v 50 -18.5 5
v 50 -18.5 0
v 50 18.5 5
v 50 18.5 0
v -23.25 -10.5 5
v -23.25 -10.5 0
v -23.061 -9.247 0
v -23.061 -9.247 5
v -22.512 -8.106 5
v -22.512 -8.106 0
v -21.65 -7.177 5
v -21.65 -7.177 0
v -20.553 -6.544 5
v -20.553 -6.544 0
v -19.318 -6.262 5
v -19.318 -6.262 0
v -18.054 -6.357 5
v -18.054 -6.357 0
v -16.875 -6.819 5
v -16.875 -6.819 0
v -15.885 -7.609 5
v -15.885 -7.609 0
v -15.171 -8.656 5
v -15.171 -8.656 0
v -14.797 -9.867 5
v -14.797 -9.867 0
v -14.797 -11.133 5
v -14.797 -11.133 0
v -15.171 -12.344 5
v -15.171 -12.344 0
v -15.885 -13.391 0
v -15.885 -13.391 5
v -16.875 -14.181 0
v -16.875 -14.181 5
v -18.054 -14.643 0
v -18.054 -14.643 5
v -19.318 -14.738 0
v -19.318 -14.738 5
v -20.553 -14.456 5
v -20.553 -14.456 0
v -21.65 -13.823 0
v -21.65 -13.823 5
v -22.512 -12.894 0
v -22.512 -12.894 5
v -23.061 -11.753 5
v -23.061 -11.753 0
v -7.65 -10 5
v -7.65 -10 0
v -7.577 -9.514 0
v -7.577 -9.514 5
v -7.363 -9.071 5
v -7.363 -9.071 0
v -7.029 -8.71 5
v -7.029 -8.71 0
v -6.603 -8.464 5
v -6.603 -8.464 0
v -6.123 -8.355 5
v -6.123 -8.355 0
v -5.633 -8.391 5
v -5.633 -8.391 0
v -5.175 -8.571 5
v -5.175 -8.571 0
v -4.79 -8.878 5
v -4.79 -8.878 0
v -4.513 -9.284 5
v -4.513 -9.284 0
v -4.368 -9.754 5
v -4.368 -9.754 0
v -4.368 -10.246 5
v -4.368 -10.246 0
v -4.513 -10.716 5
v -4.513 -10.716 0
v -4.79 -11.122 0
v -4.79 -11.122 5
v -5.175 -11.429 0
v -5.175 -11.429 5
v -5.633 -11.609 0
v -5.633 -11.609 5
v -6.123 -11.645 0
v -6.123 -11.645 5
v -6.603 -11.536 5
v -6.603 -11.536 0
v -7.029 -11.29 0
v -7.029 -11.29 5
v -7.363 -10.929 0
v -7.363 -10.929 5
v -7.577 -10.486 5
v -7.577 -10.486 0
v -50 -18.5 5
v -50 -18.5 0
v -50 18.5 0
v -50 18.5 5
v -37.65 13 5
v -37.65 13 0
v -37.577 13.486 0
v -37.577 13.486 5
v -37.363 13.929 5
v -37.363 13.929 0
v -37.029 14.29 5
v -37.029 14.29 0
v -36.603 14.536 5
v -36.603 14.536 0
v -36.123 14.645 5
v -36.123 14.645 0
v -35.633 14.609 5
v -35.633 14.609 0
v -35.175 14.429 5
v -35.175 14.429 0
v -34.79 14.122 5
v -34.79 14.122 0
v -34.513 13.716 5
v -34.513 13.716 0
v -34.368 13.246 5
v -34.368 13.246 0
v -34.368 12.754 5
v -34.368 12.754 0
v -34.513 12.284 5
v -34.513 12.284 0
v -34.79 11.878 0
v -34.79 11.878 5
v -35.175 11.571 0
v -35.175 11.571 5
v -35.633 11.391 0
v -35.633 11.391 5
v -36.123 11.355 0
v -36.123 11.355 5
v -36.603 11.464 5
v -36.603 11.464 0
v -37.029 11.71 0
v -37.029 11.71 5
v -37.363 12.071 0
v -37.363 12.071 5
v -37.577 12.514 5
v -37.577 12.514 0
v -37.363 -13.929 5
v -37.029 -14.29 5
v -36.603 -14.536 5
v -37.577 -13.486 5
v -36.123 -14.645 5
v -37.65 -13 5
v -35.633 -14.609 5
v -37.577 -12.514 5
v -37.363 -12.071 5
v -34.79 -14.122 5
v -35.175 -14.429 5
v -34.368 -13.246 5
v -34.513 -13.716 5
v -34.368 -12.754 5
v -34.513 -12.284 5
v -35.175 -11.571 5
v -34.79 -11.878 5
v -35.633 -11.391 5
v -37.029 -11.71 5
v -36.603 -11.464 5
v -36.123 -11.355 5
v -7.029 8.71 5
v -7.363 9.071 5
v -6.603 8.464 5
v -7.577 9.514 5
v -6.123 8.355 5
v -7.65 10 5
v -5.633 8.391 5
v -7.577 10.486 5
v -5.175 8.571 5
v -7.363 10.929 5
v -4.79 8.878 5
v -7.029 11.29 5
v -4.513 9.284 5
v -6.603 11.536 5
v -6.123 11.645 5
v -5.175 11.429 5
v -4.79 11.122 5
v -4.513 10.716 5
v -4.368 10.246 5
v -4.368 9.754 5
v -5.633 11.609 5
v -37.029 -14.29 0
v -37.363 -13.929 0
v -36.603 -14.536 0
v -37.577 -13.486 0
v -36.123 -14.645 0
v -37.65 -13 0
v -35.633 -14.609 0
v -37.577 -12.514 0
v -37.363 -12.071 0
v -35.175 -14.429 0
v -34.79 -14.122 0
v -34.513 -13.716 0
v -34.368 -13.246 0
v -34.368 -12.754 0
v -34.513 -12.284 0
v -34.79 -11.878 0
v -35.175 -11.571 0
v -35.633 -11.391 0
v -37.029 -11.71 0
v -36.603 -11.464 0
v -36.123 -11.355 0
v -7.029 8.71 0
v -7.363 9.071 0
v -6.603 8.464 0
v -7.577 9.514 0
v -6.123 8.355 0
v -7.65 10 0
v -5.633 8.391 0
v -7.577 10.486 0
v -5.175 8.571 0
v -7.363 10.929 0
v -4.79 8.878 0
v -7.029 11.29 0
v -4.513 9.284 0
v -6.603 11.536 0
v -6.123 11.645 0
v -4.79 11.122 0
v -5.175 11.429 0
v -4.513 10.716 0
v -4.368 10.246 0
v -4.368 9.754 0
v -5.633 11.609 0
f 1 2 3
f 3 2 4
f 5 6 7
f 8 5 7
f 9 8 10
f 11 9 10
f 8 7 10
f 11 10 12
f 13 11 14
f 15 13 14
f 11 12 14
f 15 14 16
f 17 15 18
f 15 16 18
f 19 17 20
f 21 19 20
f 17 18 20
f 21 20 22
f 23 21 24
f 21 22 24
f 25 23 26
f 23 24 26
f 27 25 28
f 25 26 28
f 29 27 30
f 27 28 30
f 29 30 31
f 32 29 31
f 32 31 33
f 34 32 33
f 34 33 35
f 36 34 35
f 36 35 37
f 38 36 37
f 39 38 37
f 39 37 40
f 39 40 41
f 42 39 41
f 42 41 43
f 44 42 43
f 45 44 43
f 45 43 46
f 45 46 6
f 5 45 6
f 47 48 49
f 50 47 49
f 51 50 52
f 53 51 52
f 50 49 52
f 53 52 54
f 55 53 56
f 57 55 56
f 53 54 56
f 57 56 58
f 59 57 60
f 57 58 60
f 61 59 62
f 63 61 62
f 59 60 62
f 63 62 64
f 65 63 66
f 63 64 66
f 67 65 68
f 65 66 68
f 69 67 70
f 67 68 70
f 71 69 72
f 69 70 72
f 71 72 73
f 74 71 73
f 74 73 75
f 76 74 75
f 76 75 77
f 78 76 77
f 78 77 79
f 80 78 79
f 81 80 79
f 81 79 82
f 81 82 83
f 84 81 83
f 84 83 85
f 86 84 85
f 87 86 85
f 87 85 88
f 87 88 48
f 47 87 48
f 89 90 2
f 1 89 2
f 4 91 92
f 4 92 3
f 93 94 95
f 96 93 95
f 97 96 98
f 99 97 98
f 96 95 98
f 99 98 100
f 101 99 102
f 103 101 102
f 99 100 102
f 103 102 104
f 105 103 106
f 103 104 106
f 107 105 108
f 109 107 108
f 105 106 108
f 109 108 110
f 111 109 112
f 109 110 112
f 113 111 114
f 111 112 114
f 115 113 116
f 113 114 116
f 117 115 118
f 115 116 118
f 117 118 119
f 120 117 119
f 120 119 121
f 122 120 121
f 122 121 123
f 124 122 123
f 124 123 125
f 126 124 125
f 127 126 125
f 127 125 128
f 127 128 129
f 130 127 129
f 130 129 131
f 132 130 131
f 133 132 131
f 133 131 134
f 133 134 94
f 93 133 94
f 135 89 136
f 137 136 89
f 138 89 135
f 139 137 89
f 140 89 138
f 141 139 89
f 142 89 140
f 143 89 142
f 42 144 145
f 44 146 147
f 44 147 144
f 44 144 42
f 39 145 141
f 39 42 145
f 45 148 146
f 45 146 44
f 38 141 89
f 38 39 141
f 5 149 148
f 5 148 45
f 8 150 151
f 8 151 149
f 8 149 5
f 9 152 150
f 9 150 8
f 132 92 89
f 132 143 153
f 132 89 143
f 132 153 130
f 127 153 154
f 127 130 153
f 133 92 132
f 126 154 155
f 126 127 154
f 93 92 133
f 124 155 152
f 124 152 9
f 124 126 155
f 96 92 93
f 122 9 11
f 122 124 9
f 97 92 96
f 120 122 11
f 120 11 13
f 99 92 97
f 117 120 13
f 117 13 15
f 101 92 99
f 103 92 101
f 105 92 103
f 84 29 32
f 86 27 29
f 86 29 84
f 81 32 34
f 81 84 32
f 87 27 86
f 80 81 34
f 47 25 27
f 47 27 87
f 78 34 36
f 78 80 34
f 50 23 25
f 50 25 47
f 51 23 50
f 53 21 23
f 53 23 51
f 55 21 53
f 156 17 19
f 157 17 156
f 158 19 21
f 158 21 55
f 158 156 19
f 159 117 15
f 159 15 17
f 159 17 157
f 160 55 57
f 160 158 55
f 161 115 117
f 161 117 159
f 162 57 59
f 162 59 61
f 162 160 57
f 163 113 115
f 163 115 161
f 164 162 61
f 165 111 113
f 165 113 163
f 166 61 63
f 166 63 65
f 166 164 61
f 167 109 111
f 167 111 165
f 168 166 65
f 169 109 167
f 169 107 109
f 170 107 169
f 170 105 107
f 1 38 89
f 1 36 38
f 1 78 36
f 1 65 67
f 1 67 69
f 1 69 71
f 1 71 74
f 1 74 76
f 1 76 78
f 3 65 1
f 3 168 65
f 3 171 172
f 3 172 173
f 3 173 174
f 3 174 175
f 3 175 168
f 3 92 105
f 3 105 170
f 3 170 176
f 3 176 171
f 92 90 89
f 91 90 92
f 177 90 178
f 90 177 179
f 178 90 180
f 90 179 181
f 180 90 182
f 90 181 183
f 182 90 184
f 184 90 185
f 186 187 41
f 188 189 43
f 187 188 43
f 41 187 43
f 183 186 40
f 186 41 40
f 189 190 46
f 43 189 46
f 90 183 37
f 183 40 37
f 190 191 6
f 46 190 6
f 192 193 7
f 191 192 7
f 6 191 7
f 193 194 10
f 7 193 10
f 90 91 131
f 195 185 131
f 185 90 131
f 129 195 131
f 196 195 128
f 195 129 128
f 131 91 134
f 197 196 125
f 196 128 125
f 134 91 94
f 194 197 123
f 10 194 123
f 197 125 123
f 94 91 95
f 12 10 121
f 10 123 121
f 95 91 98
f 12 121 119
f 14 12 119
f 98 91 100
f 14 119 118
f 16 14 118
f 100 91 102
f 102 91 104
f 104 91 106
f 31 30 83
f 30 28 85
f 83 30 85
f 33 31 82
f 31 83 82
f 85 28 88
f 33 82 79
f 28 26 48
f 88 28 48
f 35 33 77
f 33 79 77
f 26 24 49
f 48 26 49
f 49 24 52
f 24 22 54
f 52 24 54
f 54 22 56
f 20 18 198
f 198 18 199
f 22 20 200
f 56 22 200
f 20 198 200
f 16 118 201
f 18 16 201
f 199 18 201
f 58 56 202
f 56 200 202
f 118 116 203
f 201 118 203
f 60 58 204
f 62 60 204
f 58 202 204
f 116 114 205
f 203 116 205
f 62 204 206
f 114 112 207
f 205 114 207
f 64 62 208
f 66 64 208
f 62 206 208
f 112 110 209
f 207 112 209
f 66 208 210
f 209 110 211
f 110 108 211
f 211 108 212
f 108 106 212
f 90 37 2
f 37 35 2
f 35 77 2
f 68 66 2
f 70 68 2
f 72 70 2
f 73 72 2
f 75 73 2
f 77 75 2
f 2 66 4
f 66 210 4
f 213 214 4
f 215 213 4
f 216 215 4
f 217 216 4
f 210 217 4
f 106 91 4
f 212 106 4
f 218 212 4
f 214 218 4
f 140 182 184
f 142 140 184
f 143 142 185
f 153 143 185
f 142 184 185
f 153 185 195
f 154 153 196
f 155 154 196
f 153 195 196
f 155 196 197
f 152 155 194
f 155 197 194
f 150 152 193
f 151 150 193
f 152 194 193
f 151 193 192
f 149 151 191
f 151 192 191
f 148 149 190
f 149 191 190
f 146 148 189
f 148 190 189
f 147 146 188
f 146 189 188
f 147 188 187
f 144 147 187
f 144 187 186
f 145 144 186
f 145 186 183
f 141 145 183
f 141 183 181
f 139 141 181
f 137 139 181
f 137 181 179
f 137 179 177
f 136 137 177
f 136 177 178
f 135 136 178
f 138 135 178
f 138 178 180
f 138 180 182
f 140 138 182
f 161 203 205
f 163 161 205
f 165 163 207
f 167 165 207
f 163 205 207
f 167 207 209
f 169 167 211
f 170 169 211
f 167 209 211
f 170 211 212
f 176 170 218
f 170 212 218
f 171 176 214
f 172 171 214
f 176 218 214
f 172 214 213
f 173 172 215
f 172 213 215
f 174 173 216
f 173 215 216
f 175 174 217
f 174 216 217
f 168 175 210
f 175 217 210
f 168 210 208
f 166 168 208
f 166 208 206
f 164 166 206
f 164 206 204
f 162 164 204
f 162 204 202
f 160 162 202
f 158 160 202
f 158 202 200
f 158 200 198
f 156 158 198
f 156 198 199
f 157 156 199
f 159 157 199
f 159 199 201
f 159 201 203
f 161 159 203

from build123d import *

# Parameters (mm, degrees)
F0_W     = 100
F0_H     = 37
F1_DEPTH = 5
F3_D     = 3.3
F5_D     = 8.5
F7_D     = 3.3
F7_DEPTH = 6
F7_TIP   = 0.9914200214


with BuildPart() as f1:
    # F0 (on Top) → F1 (new body)
    with BuildSketch(Plane.XY):
        Rectangle(F0_W, F0_H)
    extrude(amount=F1_DEPTH)

    # F3 (through all)
    with Locations(Plane.XY.offset(5)):
        with Locations((-36, 13), (-36, -13)):
            Hole(F3_D / 2)

    # F5 (through all)
    with Locations(Plane.XY.offset(5)):
        with Locations((-19, -10.5)):
            Hole(F5_D / 2)

    # F7
    with Locations(Plane.XY.offset(5)):
        with Locations((-6, 10), (-6, -10)):
            Hole(F7_D / 2, depth=F7_DEPTH)
            with Locations((0, 0, -(F7_DEPTH + F7_TIP / 2))):  # 118° drill point
                Cone(0, F7_D / 2, F7_TIP, mode=Mode.SUBTRACT)


solid = f1.part
